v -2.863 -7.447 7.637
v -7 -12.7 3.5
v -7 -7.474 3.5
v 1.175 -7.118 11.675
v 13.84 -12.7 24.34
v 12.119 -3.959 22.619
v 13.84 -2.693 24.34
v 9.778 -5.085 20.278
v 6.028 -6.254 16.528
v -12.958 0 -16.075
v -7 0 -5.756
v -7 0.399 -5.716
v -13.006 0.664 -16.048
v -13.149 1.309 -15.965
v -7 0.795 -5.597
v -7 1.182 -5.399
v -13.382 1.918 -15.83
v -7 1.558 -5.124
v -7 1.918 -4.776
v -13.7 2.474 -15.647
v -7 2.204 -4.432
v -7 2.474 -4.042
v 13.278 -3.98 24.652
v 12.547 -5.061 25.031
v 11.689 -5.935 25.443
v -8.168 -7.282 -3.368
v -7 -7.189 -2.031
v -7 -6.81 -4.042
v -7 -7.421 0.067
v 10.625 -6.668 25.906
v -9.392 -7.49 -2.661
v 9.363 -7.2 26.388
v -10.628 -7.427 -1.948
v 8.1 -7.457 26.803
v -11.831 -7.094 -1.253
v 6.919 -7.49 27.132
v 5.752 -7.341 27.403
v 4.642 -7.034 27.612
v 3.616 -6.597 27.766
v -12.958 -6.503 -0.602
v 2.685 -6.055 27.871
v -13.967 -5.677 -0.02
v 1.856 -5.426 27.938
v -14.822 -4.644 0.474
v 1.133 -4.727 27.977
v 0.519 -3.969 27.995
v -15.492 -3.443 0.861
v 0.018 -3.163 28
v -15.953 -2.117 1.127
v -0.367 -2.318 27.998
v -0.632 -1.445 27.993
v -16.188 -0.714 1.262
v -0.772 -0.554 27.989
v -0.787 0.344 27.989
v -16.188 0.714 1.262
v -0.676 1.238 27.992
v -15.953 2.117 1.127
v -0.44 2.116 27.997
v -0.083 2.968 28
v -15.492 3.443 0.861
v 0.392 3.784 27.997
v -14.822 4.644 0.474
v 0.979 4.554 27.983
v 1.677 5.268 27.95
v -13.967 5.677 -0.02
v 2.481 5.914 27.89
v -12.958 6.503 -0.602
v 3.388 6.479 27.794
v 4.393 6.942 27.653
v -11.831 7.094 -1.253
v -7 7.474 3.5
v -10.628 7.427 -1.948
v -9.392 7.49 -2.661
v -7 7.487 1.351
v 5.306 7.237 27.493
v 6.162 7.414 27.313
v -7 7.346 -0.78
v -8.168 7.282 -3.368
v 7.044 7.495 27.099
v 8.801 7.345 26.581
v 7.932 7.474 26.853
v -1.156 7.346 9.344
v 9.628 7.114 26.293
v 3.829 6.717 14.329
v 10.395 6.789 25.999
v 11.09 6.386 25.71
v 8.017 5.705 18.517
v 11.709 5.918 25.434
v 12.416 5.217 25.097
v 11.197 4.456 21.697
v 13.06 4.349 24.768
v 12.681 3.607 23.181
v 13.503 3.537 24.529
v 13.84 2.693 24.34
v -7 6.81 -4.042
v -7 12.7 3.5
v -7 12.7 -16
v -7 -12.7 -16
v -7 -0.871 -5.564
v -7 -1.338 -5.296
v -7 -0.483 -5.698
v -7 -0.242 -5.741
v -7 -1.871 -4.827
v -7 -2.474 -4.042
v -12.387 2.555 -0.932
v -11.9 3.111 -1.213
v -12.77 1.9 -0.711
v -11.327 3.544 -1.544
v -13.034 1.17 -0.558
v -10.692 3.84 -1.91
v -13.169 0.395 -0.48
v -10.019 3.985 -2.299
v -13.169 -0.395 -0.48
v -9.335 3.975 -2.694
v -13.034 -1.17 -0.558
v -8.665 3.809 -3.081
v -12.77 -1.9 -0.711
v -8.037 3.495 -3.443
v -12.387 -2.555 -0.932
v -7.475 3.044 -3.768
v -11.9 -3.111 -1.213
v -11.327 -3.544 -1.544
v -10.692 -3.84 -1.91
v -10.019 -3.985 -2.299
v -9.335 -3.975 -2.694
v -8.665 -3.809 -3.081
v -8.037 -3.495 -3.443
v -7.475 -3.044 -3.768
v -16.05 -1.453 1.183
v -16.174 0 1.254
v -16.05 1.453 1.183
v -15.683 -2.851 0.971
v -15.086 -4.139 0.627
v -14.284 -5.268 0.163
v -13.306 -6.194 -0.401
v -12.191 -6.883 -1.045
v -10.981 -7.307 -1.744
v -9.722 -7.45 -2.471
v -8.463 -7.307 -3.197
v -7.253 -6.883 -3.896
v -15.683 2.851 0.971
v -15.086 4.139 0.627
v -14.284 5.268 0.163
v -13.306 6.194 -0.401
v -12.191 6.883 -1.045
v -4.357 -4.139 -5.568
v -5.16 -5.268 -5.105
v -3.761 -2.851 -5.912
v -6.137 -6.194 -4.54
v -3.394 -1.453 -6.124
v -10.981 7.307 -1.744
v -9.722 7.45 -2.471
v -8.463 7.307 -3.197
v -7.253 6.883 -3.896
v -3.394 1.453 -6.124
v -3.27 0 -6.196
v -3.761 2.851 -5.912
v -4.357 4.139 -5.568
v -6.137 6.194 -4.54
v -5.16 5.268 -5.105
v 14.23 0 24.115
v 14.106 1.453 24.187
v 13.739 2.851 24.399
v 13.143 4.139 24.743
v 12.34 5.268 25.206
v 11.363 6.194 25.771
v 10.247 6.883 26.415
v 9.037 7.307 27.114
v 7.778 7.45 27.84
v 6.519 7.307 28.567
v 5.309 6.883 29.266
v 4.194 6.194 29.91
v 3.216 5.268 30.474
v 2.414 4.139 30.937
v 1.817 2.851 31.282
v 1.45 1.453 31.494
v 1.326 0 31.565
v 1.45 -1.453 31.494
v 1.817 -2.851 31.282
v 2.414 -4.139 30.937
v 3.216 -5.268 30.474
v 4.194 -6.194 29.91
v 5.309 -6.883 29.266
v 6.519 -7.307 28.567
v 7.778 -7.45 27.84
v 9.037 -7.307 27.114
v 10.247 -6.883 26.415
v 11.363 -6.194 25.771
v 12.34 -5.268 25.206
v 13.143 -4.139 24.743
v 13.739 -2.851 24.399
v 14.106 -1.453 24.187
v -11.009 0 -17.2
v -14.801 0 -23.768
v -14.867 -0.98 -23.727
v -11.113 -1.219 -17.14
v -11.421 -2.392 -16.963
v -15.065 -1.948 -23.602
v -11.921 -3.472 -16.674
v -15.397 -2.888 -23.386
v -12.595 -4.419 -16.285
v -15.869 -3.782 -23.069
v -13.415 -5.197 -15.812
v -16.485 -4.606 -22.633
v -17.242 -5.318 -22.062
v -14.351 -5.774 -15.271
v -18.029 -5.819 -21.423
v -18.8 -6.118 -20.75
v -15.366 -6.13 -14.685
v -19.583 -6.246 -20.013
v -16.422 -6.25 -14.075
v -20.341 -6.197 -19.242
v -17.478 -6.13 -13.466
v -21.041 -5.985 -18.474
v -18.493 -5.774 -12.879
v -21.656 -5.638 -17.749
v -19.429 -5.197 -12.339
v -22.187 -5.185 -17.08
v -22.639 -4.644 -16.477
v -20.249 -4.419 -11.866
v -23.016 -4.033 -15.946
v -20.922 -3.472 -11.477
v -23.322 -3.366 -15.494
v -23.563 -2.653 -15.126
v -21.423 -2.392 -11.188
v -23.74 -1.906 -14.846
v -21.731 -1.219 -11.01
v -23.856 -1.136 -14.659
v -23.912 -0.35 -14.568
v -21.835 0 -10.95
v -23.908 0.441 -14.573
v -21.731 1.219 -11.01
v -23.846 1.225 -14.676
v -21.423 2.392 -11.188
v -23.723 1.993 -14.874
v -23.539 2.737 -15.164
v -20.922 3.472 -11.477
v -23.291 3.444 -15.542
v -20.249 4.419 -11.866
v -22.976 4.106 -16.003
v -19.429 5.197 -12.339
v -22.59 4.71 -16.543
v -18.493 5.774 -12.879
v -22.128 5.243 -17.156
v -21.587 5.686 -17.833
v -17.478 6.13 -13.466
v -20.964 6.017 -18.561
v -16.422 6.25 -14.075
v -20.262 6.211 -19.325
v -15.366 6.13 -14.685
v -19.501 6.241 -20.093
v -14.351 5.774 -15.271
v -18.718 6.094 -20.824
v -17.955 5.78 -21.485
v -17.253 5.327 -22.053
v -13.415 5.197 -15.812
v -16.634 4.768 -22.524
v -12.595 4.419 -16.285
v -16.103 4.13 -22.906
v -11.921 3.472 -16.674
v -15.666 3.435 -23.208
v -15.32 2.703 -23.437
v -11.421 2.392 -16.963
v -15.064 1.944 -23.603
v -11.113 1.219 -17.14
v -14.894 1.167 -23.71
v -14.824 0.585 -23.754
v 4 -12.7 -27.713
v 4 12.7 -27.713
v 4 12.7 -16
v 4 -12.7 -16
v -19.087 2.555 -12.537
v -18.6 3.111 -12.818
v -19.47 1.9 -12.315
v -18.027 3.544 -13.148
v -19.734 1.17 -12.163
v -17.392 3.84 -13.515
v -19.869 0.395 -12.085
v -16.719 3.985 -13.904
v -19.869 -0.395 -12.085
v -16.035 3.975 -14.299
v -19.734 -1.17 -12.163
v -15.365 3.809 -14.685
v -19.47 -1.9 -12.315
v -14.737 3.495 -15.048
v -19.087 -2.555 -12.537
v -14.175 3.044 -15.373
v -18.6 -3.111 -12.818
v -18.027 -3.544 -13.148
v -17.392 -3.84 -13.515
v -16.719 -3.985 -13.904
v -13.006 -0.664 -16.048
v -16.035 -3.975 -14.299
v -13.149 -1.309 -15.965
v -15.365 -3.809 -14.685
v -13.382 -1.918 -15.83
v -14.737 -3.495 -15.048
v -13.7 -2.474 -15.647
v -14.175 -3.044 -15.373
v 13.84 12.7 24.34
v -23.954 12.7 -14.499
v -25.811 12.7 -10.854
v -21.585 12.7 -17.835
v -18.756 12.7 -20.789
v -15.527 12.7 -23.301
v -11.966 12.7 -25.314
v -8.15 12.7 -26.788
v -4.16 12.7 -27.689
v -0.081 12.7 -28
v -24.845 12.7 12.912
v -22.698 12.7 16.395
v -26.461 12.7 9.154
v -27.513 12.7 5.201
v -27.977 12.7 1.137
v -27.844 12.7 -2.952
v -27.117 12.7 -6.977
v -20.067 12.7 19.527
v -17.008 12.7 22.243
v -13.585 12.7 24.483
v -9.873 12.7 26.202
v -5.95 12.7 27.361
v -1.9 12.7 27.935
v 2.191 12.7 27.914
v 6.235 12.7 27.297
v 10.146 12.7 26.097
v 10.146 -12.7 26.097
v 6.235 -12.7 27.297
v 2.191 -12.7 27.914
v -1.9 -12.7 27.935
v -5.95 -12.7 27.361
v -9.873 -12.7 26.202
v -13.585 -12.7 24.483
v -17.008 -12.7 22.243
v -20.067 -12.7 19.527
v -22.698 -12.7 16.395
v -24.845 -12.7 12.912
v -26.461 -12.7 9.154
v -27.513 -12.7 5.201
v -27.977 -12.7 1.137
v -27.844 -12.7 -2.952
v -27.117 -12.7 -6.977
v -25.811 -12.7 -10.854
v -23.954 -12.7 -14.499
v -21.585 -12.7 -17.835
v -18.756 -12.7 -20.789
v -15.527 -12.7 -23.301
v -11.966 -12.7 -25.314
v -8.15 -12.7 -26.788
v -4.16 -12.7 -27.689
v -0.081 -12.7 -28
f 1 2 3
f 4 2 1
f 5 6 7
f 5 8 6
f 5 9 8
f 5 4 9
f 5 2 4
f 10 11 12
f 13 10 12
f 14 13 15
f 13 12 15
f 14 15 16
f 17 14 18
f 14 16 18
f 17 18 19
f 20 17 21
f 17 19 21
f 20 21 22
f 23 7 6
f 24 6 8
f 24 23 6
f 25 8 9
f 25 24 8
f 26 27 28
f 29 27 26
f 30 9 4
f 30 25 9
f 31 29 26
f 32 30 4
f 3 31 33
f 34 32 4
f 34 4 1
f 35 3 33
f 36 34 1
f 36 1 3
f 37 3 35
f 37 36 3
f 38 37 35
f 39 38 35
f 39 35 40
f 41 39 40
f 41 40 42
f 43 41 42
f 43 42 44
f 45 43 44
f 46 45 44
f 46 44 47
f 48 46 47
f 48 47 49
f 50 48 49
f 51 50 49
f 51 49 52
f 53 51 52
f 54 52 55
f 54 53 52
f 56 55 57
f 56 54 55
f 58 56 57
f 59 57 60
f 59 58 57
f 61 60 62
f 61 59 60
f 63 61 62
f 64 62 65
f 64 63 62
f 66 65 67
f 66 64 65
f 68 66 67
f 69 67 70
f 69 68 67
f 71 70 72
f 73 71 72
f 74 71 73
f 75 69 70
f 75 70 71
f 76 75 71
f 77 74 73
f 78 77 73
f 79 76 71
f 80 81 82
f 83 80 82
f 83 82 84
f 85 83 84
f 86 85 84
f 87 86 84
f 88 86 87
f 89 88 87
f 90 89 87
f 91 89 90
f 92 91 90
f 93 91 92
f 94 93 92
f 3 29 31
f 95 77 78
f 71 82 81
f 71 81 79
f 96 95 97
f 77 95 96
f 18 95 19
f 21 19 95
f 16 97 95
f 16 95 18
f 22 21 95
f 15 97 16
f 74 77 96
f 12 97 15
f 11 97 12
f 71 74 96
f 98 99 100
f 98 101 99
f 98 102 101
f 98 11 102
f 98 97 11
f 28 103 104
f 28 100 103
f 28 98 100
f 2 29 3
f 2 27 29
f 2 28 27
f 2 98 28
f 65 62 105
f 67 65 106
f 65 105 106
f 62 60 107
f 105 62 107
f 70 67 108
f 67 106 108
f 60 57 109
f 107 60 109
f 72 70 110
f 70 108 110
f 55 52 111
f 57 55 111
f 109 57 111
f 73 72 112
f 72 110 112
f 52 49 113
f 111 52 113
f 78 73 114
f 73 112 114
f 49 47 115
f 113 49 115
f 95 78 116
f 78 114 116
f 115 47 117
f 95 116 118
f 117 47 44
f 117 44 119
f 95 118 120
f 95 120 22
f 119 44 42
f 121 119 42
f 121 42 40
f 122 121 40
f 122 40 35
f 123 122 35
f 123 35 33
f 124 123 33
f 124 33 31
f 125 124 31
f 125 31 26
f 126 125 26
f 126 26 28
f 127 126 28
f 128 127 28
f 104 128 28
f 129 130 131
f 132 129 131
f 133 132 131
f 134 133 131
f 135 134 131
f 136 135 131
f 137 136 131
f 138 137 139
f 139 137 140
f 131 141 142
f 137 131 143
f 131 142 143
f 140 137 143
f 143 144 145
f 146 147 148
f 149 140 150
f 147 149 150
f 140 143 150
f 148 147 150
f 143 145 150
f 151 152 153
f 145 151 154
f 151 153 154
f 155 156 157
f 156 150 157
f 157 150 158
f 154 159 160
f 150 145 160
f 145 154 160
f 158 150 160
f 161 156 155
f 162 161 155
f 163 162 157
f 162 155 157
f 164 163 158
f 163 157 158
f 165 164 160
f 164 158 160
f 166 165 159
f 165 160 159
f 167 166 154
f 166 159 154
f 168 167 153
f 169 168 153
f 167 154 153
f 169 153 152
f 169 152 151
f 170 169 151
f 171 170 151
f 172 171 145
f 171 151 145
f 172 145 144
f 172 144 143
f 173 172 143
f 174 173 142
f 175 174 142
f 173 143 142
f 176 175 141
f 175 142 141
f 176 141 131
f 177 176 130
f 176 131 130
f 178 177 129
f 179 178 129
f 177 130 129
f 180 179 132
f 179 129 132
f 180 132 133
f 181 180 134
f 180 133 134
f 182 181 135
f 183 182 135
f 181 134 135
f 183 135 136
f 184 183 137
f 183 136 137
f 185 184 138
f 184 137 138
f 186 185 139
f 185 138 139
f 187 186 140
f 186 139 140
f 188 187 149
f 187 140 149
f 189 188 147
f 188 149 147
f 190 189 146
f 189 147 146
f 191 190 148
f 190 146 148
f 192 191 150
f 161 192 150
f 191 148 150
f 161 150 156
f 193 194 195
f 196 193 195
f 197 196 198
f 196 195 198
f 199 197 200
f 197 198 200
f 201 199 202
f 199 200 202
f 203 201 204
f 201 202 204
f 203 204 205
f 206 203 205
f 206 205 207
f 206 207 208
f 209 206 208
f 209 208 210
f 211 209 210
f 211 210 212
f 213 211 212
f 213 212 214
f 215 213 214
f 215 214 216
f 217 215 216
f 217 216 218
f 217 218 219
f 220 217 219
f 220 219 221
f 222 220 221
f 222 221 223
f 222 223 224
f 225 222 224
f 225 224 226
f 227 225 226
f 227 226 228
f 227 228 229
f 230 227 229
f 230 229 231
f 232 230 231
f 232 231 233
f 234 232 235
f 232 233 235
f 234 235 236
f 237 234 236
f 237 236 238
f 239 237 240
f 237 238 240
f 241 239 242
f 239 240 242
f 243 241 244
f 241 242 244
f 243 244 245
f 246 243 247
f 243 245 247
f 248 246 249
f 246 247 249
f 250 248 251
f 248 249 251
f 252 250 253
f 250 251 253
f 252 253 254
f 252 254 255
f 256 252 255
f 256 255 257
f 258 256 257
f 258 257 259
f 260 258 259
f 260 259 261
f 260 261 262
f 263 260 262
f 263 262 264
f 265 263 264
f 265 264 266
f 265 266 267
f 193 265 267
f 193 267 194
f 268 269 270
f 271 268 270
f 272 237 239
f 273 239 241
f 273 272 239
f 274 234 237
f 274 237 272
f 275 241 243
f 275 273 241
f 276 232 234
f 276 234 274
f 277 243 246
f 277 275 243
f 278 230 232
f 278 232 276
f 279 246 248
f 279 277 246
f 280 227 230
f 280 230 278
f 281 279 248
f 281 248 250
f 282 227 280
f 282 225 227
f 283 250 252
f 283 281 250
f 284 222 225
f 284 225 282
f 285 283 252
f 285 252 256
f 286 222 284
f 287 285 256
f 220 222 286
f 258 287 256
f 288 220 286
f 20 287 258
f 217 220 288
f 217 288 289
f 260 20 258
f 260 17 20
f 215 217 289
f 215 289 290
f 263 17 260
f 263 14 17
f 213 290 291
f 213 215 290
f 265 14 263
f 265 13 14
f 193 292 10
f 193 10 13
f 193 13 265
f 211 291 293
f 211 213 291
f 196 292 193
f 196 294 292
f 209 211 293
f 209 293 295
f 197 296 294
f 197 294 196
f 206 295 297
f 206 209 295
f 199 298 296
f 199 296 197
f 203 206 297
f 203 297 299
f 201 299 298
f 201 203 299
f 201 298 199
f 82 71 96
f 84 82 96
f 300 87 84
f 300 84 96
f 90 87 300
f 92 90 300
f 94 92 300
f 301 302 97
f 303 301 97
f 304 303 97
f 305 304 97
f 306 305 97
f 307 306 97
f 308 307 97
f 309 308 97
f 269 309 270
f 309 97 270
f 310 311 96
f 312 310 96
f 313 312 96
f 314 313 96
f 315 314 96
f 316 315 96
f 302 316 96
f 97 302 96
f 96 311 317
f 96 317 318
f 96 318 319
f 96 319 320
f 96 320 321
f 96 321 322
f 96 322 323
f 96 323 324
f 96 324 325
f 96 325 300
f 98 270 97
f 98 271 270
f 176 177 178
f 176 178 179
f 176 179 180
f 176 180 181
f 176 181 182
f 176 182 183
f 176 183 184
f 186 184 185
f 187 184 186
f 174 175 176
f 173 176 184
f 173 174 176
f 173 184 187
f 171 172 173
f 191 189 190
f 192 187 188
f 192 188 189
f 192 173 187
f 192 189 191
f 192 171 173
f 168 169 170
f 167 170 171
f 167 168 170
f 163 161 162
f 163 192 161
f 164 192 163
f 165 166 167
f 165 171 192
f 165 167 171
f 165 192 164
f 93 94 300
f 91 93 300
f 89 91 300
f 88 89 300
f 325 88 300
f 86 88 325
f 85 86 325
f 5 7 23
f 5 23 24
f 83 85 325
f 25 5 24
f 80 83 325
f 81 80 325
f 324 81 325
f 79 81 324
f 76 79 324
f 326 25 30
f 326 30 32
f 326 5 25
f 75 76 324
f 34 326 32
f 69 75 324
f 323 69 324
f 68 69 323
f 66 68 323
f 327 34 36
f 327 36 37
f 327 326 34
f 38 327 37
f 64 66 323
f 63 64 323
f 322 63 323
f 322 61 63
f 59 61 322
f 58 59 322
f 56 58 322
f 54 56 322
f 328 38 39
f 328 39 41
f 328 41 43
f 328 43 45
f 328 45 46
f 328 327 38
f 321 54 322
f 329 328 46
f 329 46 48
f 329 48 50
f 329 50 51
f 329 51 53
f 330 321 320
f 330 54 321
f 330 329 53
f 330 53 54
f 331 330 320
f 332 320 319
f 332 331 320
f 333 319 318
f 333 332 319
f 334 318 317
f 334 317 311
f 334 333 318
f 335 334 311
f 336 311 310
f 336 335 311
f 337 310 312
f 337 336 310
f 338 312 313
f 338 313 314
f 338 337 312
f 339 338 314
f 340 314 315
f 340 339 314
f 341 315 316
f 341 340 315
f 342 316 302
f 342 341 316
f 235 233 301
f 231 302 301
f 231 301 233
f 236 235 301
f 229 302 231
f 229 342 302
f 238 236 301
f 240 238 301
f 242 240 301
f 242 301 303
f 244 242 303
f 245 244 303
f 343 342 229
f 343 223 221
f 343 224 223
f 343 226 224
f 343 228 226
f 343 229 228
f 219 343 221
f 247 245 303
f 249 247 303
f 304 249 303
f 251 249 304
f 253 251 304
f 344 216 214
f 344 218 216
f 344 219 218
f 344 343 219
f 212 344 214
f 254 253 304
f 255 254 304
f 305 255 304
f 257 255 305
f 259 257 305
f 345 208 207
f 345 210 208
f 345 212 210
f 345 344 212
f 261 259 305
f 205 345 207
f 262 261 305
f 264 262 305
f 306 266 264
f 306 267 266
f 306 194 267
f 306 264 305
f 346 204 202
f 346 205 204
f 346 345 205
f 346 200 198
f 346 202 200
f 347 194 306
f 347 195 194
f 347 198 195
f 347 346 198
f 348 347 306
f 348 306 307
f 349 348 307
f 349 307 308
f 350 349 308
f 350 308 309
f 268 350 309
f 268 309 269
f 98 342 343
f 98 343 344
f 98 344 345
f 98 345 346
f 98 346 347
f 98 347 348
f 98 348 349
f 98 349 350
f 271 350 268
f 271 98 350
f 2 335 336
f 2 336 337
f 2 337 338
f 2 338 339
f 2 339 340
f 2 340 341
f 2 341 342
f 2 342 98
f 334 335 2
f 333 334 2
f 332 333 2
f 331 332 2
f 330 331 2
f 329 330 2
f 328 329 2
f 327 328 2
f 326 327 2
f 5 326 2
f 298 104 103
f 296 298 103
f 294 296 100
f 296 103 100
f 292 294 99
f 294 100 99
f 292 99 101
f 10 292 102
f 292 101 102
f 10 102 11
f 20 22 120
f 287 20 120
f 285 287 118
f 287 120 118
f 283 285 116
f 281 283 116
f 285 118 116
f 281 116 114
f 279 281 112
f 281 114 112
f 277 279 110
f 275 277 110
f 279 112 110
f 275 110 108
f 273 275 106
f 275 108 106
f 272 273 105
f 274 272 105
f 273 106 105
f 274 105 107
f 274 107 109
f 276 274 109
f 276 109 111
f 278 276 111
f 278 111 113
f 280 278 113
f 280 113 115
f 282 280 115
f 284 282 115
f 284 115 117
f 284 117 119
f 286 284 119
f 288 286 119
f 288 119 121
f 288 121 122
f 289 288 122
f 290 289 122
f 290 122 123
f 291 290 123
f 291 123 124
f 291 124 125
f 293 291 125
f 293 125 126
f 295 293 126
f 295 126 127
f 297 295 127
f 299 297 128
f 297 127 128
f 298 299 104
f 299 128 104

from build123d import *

# Parameters (mm, degrees)
F1_DEPTH  = 12.7
F3_R      = 7.5
F4_DEPTH  = 35
F6_DEPTH  = 25
F8_R      = 6.25
F9_DEPTH  = 8
F10_R     = 7.45
F11_DEPTH = 35


with BuildPart() as f1:
    # F0 (on Front) → F1 (new body, symmetric)
    with BuildSketch(Plane.XZ):
        with BuildLine():
            Line((-7, 3.5), (13.8402462006, 24.3402462006))
            ThreePointArc((13.8402462006, 24.3402462006), (-27.5127031952, 5.2010732444), (4, -27.7128129211))
            Line((4, -27.7128129211), (4, -16))
            Line((4, -16), (-7, -16))
            Line((-7, -16), (-7, 3.5))
        make_face()
    extrude(amount=F1_DEPTH, both=True)

    # F3 (on face) → F4 (cut)
    with BuildSketch(Plane(origin=(13.9996973222, 0, 24.2481870526), x_dir=(0.8660254038, 0, -0.5), z_dir=(-0.5, 0, -0.8660254038))):
        with Locations((-7.1841182959, 0)):
            Circle(F3_R)
    extrude(amount=F4_DEPTH, mode=Mode.SUBTRACT)

    # F5 (on face) → F6 (cut)
    with BuildSketch(Plane(origin=(-3.5003026778, 0, -6.0627020798), x_dir=(0.8660254038, 0, -0.5), z_dir=(0.5, 0, 0.8660254038))):
        with BuildLine():
            Line((-4.0411023821, -2.474156617), (-4.0411023821, 2.474156617))
            ThreePointArc((-4.0411023821, 2.474156617), (-11.1841182959, 0), (-4.0411023821, -2.474156617))
        make_face()
        with BuildLine():
            ThreePointArc((-4.0411023821, -2.474156617), (-3.4044315592, -1.3091860725), (-3.1841182959, 0))
            ThreePointArc((-3.1841182959, 0), (-3.4044315592, 1.3091860725), (-4.0411023821, 2.474156617))
            Line((-4.0411023821, 2.474156617), (-4.0411023821, -2.474156617))
        make_face()
    extrude(amount=-F6_DEPTH, mode=Mode.SUBTRACT)

    # F8 (on face) → F9 (cut)
    with BuildSketch(Plane(origin=(-14.2003026778, 0, -24.5956457208), x_dir=(0.8660254038, 0, -0.5), z_dir=(-0.5, 0, -0.8660254038))):
        with Locations((-7.1841182959, 0)):
            Circle(F8_R)
    extrude(amount=-F9_DEPTH, mode=Mode.SUBTRACT)


with BuildPart() as f11:
    # F10 (on face) → F11 (new body)
    with BuildSketch(Plane(origin=(-3.5003026778, 0, -6.0627020798), x_dir=(0.8660254038, 0, -0.5), z_dir=(0.5, 0, 0.8660254038))):
        with Locations((-7.1841182959, 0)):
            Circle(F10_R)
    extrude(amount=F11_DEPTH)


solid = Compound([f1.part, f11.part])
